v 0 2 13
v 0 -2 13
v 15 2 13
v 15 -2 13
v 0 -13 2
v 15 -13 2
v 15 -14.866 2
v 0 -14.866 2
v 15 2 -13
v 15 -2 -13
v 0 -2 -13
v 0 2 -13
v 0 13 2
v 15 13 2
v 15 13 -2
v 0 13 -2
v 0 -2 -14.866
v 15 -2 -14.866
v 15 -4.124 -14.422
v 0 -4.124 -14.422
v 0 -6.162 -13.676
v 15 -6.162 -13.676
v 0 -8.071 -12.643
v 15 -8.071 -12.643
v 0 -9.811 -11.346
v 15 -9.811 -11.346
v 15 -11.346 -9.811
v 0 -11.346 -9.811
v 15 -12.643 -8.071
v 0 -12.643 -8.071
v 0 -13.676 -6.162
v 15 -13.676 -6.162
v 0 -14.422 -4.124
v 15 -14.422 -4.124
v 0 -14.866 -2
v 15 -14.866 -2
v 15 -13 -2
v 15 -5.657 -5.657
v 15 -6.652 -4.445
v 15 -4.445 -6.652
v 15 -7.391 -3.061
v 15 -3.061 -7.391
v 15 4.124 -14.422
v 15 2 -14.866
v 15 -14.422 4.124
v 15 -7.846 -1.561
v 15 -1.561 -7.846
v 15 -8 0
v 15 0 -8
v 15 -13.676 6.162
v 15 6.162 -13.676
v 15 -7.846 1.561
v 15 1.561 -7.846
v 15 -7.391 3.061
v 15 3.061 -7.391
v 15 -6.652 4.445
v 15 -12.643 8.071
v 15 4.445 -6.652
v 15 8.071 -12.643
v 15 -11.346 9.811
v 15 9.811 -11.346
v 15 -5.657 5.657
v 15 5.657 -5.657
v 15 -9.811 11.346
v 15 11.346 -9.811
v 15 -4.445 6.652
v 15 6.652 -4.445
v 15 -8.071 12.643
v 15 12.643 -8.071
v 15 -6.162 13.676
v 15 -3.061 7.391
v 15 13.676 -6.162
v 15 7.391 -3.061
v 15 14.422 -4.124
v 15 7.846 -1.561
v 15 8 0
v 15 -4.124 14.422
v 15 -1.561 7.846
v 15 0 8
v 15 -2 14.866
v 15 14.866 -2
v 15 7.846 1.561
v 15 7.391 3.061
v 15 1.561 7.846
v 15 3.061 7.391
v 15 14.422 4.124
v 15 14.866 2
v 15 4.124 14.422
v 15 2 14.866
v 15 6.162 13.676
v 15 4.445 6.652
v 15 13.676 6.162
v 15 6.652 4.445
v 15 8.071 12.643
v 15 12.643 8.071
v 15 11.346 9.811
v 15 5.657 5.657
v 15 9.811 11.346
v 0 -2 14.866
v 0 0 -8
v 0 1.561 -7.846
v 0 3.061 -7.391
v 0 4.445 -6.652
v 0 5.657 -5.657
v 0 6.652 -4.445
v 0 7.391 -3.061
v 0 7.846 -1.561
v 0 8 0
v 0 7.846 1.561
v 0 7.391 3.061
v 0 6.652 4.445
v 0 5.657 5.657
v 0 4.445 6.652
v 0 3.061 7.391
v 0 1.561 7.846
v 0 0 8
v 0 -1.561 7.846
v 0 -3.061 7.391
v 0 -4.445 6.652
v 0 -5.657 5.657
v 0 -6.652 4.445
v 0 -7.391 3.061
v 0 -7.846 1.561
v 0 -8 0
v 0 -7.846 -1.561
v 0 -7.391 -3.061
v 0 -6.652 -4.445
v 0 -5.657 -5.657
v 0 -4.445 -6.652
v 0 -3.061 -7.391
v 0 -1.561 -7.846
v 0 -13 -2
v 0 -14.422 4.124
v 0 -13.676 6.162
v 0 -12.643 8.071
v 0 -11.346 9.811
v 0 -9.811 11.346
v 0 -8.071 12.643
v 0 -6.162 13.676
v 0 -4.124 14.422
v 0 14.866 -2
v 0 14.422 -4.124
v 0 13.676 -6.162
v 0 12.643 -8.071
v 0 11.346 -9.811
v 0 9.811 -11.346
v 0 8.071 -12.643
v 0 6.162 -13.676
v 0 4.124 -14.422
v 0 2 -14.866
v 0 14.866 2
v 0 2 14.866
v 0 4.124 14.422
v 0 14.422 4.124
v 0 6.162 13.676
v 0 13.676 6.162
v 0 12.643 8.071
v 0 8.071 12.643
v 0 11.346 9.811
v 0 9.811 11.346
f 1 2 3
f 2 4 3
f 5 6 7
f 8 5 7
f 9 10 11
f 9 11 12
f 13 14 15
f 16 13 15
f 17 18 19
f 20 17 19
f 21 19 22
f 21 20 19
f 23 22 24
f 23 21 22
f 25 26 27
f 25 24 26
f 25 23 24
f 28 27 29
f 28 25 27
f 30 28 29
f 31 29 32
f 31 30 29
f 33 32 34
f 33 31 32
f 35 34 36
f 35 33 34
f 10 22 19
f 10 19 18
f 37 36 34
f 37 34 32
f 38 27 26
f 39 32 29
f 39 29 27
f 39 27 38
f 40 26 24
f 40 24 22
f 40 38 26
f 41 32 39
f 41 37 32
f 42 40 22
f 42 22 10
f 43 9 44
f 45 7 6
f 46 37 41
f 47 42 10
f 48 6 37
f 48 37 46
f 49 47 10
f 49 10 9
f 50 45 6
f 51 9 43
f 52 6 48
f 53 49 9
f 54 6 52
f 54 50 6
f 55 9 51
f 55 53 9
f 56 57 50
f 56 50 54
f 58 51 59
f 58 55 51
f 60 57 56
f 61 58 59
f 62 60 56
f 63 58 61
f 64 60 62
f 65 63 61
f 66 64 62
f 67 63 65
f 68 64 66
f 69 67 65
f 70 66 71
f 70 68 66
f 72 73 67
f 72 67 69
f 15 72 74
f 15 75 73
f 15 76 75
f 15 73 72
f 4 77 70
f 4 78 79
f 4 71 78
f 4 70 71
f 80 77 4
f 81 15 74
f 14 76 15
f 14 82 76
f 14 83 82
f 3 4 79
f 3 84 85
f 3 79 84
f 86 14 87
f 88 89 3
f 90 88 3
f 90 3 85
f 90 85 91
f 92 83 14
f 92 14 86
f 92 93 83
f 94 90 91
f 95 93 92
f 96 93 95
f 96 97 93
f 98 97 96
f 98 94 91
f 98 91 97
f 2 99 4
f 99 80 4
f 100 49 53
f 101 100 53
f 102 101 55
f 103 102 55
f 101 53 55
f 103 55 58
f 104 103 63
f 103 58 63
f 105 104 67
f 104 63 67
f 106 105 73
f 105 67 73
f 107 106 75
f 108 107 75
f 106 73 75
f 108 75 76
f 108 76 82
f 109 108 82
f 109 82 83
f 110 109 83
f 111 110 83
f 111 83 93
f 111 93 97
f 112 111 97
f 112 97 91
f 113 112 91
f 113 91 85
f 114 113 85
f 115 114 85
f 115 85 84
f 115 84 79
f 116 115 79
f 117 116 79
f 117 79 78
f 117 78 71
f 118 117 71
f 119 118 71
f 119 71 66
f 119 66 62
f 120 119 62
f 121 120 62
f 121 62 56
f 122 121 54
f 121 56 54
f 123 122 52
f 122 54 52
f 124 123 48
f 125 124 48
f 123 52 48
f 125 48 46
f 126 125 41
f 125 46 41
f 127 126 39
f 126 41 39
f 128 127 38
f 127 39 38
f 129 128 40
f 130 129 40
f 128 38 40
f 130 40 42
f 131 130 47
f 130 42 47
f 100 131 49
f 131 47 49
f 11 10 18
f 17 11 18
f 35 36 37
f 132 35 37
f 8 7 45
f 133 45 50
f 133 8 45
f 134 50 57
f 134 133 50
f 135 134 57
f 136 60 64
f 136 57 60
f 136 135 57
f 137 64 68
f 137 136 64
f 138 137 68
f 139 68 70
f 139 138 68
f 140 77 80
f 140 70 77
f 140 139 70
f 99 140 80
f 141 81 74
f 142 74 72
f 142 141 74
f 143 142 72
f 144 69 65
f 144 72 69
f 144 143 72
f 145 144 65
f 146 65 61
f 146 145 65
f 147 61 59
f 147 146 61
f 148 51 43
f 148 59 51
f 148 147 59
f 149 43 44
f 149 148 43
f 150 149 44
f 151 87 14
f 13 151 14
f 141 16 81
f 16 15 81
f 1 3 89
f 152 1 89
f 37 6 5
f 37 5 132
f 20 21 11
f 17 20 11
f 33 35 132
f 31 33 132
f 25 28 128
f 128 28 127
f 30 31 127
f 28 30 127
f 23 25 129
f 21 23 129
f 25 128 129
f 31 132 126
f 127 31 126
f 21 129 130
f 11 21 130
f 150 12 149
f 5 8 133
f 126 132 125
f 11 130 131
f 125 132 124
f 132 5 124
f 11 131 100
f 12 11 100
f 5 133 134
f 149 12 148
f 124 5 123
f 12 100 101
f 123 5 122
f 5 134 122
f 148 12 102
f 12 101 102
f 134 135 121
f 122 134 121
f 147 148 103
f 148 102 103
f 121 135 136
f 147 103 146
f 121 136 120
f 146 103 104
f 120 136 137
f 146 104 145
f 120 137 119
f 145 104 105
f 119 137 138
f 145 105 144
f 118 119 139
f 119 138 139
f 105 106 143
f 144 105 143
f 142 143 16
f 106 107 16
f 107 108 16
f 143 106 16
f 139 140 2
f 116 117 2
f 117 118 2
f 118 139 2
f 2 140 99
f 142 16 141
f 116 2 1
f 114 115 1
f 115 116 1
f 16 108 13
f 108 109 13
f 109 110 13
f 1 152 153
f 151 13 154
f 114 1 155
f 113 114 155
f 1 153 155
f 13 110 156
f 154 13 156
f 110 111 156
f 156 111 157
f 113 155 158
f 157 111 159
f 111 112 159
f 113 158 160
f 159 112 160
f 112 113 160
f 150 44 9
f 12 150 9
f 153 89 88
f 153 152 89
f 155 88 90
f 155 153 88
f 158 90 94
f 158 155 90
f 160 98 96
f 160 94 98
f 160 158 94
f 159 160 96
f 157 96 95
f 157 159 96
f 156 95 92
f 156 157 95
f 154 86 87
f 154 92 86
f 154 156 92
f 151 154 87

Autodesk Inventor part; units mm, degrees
ref_plane "YZ Plane" through (0, 0, 0) normal (1, 0, 0) x (0, 1, 0)
ref_plane "XZ Plane" through (0, 0, 0) normal (0, 1, 0) x (-1, 0, 0)
ref_plane "XY Plane" through (0, 0, 0) normal (0, 0, 1) x (1, 0, 0)
sketch "Sketch1" plane through (0, 0, 0) normal (1, 0, 0) x (0, 1, 0)
  circle A0 centre (0, 0) radius 15
  dimension "d0" = 30
extrude "Extrusion1" add sketch "Sketch1" along normal blind 15
sketch "Sketch2" plane through (15, 0, 0) normal (1, 0, 0) x (0, 0, -1)
  circle A0 centre (0, 0) radius 8
  dimension "d3" = 16
extrude "Extrusion2" cut sketch "Sketch2" against normal blind 15
thread "Thread1" size "M16x2" class "6H" standard "ISO Metric profile" length 13
sketch "Sketch3" plane through (15, 0, 0) normal (1, 0, 0) x (0, 0, -1)
  circle A0 centre (0, 0) radius 15 projected
  line L0 (0, 15) -> (0, 13)
  line L1 (0, 13) -> (-2, 13)
  line L2 (-2, 13) -> (2, 13)
  line L3 (2, 13) -> (2, 17.4599)
  line L4 (2, 17.4599) -> (-2, 17.4599)
  line L5 (-2, 17.4599) -> (-2, 13)
  line L6 (-15, 0) -> (-13, 0)
  line L7 (-13, 0) -> (-13, -2)
  line L8 (-13, -2) -> (-13, 2)
  line L9 (-13, 2) -> (-17.4599, 2)
  line L10 (-17.4599, 2) -> (-17.4599, -2)
  line L11 (-17.4599, -2) -> (-13, -2)
  line L12 (0, -15) -> (0, -13)
  line L13 (0, -13) -> (2, -13)
  line L14 (2, -13) -> (-2, -13)
  line L15 (-2, -13) -> (-2, -17.4599)
  line L16 (-2, -17.4599) -> (2, -17.4599)
  line L17 (2, -17.4599) -> (2, -13)
  line L18 (15, 0) -> (13, 0)
  line L19 (13, 0) -> (13, 2)
  line L20 (13, 2) -> (13, -2)
  line L21 (13, -2) -> (17.4599, -2)
  line L22 (17.4599, -2) -> (17.4599, 2)
  line L23 (17.4599, 2) -> (13, 2)
  dimension "d8" = 2
  dimension "d9" = 2
  dimension "d10" = 4
  dimension "d13" = 360
extrude "Extrusion3" cut sketch "Sketch3" against normal blind 15 contours L18 L19 L23 A0 | A0 L23 L22 L21 | A0 L21 L20 L18 | L3 L2 L0 A0 | A0 L5 L4 L3 | L17 L16 L15 A0 | A0 L12 L13 L17 | L0 L1 L5 A0 | A0 L15 L14 L12 | L9 L8 L6 A0 | A0 L11 L10 L9 | A0 L6 L7 L11
properties part number "9. LockNutM16" material "Steel, Mild, Welded"
